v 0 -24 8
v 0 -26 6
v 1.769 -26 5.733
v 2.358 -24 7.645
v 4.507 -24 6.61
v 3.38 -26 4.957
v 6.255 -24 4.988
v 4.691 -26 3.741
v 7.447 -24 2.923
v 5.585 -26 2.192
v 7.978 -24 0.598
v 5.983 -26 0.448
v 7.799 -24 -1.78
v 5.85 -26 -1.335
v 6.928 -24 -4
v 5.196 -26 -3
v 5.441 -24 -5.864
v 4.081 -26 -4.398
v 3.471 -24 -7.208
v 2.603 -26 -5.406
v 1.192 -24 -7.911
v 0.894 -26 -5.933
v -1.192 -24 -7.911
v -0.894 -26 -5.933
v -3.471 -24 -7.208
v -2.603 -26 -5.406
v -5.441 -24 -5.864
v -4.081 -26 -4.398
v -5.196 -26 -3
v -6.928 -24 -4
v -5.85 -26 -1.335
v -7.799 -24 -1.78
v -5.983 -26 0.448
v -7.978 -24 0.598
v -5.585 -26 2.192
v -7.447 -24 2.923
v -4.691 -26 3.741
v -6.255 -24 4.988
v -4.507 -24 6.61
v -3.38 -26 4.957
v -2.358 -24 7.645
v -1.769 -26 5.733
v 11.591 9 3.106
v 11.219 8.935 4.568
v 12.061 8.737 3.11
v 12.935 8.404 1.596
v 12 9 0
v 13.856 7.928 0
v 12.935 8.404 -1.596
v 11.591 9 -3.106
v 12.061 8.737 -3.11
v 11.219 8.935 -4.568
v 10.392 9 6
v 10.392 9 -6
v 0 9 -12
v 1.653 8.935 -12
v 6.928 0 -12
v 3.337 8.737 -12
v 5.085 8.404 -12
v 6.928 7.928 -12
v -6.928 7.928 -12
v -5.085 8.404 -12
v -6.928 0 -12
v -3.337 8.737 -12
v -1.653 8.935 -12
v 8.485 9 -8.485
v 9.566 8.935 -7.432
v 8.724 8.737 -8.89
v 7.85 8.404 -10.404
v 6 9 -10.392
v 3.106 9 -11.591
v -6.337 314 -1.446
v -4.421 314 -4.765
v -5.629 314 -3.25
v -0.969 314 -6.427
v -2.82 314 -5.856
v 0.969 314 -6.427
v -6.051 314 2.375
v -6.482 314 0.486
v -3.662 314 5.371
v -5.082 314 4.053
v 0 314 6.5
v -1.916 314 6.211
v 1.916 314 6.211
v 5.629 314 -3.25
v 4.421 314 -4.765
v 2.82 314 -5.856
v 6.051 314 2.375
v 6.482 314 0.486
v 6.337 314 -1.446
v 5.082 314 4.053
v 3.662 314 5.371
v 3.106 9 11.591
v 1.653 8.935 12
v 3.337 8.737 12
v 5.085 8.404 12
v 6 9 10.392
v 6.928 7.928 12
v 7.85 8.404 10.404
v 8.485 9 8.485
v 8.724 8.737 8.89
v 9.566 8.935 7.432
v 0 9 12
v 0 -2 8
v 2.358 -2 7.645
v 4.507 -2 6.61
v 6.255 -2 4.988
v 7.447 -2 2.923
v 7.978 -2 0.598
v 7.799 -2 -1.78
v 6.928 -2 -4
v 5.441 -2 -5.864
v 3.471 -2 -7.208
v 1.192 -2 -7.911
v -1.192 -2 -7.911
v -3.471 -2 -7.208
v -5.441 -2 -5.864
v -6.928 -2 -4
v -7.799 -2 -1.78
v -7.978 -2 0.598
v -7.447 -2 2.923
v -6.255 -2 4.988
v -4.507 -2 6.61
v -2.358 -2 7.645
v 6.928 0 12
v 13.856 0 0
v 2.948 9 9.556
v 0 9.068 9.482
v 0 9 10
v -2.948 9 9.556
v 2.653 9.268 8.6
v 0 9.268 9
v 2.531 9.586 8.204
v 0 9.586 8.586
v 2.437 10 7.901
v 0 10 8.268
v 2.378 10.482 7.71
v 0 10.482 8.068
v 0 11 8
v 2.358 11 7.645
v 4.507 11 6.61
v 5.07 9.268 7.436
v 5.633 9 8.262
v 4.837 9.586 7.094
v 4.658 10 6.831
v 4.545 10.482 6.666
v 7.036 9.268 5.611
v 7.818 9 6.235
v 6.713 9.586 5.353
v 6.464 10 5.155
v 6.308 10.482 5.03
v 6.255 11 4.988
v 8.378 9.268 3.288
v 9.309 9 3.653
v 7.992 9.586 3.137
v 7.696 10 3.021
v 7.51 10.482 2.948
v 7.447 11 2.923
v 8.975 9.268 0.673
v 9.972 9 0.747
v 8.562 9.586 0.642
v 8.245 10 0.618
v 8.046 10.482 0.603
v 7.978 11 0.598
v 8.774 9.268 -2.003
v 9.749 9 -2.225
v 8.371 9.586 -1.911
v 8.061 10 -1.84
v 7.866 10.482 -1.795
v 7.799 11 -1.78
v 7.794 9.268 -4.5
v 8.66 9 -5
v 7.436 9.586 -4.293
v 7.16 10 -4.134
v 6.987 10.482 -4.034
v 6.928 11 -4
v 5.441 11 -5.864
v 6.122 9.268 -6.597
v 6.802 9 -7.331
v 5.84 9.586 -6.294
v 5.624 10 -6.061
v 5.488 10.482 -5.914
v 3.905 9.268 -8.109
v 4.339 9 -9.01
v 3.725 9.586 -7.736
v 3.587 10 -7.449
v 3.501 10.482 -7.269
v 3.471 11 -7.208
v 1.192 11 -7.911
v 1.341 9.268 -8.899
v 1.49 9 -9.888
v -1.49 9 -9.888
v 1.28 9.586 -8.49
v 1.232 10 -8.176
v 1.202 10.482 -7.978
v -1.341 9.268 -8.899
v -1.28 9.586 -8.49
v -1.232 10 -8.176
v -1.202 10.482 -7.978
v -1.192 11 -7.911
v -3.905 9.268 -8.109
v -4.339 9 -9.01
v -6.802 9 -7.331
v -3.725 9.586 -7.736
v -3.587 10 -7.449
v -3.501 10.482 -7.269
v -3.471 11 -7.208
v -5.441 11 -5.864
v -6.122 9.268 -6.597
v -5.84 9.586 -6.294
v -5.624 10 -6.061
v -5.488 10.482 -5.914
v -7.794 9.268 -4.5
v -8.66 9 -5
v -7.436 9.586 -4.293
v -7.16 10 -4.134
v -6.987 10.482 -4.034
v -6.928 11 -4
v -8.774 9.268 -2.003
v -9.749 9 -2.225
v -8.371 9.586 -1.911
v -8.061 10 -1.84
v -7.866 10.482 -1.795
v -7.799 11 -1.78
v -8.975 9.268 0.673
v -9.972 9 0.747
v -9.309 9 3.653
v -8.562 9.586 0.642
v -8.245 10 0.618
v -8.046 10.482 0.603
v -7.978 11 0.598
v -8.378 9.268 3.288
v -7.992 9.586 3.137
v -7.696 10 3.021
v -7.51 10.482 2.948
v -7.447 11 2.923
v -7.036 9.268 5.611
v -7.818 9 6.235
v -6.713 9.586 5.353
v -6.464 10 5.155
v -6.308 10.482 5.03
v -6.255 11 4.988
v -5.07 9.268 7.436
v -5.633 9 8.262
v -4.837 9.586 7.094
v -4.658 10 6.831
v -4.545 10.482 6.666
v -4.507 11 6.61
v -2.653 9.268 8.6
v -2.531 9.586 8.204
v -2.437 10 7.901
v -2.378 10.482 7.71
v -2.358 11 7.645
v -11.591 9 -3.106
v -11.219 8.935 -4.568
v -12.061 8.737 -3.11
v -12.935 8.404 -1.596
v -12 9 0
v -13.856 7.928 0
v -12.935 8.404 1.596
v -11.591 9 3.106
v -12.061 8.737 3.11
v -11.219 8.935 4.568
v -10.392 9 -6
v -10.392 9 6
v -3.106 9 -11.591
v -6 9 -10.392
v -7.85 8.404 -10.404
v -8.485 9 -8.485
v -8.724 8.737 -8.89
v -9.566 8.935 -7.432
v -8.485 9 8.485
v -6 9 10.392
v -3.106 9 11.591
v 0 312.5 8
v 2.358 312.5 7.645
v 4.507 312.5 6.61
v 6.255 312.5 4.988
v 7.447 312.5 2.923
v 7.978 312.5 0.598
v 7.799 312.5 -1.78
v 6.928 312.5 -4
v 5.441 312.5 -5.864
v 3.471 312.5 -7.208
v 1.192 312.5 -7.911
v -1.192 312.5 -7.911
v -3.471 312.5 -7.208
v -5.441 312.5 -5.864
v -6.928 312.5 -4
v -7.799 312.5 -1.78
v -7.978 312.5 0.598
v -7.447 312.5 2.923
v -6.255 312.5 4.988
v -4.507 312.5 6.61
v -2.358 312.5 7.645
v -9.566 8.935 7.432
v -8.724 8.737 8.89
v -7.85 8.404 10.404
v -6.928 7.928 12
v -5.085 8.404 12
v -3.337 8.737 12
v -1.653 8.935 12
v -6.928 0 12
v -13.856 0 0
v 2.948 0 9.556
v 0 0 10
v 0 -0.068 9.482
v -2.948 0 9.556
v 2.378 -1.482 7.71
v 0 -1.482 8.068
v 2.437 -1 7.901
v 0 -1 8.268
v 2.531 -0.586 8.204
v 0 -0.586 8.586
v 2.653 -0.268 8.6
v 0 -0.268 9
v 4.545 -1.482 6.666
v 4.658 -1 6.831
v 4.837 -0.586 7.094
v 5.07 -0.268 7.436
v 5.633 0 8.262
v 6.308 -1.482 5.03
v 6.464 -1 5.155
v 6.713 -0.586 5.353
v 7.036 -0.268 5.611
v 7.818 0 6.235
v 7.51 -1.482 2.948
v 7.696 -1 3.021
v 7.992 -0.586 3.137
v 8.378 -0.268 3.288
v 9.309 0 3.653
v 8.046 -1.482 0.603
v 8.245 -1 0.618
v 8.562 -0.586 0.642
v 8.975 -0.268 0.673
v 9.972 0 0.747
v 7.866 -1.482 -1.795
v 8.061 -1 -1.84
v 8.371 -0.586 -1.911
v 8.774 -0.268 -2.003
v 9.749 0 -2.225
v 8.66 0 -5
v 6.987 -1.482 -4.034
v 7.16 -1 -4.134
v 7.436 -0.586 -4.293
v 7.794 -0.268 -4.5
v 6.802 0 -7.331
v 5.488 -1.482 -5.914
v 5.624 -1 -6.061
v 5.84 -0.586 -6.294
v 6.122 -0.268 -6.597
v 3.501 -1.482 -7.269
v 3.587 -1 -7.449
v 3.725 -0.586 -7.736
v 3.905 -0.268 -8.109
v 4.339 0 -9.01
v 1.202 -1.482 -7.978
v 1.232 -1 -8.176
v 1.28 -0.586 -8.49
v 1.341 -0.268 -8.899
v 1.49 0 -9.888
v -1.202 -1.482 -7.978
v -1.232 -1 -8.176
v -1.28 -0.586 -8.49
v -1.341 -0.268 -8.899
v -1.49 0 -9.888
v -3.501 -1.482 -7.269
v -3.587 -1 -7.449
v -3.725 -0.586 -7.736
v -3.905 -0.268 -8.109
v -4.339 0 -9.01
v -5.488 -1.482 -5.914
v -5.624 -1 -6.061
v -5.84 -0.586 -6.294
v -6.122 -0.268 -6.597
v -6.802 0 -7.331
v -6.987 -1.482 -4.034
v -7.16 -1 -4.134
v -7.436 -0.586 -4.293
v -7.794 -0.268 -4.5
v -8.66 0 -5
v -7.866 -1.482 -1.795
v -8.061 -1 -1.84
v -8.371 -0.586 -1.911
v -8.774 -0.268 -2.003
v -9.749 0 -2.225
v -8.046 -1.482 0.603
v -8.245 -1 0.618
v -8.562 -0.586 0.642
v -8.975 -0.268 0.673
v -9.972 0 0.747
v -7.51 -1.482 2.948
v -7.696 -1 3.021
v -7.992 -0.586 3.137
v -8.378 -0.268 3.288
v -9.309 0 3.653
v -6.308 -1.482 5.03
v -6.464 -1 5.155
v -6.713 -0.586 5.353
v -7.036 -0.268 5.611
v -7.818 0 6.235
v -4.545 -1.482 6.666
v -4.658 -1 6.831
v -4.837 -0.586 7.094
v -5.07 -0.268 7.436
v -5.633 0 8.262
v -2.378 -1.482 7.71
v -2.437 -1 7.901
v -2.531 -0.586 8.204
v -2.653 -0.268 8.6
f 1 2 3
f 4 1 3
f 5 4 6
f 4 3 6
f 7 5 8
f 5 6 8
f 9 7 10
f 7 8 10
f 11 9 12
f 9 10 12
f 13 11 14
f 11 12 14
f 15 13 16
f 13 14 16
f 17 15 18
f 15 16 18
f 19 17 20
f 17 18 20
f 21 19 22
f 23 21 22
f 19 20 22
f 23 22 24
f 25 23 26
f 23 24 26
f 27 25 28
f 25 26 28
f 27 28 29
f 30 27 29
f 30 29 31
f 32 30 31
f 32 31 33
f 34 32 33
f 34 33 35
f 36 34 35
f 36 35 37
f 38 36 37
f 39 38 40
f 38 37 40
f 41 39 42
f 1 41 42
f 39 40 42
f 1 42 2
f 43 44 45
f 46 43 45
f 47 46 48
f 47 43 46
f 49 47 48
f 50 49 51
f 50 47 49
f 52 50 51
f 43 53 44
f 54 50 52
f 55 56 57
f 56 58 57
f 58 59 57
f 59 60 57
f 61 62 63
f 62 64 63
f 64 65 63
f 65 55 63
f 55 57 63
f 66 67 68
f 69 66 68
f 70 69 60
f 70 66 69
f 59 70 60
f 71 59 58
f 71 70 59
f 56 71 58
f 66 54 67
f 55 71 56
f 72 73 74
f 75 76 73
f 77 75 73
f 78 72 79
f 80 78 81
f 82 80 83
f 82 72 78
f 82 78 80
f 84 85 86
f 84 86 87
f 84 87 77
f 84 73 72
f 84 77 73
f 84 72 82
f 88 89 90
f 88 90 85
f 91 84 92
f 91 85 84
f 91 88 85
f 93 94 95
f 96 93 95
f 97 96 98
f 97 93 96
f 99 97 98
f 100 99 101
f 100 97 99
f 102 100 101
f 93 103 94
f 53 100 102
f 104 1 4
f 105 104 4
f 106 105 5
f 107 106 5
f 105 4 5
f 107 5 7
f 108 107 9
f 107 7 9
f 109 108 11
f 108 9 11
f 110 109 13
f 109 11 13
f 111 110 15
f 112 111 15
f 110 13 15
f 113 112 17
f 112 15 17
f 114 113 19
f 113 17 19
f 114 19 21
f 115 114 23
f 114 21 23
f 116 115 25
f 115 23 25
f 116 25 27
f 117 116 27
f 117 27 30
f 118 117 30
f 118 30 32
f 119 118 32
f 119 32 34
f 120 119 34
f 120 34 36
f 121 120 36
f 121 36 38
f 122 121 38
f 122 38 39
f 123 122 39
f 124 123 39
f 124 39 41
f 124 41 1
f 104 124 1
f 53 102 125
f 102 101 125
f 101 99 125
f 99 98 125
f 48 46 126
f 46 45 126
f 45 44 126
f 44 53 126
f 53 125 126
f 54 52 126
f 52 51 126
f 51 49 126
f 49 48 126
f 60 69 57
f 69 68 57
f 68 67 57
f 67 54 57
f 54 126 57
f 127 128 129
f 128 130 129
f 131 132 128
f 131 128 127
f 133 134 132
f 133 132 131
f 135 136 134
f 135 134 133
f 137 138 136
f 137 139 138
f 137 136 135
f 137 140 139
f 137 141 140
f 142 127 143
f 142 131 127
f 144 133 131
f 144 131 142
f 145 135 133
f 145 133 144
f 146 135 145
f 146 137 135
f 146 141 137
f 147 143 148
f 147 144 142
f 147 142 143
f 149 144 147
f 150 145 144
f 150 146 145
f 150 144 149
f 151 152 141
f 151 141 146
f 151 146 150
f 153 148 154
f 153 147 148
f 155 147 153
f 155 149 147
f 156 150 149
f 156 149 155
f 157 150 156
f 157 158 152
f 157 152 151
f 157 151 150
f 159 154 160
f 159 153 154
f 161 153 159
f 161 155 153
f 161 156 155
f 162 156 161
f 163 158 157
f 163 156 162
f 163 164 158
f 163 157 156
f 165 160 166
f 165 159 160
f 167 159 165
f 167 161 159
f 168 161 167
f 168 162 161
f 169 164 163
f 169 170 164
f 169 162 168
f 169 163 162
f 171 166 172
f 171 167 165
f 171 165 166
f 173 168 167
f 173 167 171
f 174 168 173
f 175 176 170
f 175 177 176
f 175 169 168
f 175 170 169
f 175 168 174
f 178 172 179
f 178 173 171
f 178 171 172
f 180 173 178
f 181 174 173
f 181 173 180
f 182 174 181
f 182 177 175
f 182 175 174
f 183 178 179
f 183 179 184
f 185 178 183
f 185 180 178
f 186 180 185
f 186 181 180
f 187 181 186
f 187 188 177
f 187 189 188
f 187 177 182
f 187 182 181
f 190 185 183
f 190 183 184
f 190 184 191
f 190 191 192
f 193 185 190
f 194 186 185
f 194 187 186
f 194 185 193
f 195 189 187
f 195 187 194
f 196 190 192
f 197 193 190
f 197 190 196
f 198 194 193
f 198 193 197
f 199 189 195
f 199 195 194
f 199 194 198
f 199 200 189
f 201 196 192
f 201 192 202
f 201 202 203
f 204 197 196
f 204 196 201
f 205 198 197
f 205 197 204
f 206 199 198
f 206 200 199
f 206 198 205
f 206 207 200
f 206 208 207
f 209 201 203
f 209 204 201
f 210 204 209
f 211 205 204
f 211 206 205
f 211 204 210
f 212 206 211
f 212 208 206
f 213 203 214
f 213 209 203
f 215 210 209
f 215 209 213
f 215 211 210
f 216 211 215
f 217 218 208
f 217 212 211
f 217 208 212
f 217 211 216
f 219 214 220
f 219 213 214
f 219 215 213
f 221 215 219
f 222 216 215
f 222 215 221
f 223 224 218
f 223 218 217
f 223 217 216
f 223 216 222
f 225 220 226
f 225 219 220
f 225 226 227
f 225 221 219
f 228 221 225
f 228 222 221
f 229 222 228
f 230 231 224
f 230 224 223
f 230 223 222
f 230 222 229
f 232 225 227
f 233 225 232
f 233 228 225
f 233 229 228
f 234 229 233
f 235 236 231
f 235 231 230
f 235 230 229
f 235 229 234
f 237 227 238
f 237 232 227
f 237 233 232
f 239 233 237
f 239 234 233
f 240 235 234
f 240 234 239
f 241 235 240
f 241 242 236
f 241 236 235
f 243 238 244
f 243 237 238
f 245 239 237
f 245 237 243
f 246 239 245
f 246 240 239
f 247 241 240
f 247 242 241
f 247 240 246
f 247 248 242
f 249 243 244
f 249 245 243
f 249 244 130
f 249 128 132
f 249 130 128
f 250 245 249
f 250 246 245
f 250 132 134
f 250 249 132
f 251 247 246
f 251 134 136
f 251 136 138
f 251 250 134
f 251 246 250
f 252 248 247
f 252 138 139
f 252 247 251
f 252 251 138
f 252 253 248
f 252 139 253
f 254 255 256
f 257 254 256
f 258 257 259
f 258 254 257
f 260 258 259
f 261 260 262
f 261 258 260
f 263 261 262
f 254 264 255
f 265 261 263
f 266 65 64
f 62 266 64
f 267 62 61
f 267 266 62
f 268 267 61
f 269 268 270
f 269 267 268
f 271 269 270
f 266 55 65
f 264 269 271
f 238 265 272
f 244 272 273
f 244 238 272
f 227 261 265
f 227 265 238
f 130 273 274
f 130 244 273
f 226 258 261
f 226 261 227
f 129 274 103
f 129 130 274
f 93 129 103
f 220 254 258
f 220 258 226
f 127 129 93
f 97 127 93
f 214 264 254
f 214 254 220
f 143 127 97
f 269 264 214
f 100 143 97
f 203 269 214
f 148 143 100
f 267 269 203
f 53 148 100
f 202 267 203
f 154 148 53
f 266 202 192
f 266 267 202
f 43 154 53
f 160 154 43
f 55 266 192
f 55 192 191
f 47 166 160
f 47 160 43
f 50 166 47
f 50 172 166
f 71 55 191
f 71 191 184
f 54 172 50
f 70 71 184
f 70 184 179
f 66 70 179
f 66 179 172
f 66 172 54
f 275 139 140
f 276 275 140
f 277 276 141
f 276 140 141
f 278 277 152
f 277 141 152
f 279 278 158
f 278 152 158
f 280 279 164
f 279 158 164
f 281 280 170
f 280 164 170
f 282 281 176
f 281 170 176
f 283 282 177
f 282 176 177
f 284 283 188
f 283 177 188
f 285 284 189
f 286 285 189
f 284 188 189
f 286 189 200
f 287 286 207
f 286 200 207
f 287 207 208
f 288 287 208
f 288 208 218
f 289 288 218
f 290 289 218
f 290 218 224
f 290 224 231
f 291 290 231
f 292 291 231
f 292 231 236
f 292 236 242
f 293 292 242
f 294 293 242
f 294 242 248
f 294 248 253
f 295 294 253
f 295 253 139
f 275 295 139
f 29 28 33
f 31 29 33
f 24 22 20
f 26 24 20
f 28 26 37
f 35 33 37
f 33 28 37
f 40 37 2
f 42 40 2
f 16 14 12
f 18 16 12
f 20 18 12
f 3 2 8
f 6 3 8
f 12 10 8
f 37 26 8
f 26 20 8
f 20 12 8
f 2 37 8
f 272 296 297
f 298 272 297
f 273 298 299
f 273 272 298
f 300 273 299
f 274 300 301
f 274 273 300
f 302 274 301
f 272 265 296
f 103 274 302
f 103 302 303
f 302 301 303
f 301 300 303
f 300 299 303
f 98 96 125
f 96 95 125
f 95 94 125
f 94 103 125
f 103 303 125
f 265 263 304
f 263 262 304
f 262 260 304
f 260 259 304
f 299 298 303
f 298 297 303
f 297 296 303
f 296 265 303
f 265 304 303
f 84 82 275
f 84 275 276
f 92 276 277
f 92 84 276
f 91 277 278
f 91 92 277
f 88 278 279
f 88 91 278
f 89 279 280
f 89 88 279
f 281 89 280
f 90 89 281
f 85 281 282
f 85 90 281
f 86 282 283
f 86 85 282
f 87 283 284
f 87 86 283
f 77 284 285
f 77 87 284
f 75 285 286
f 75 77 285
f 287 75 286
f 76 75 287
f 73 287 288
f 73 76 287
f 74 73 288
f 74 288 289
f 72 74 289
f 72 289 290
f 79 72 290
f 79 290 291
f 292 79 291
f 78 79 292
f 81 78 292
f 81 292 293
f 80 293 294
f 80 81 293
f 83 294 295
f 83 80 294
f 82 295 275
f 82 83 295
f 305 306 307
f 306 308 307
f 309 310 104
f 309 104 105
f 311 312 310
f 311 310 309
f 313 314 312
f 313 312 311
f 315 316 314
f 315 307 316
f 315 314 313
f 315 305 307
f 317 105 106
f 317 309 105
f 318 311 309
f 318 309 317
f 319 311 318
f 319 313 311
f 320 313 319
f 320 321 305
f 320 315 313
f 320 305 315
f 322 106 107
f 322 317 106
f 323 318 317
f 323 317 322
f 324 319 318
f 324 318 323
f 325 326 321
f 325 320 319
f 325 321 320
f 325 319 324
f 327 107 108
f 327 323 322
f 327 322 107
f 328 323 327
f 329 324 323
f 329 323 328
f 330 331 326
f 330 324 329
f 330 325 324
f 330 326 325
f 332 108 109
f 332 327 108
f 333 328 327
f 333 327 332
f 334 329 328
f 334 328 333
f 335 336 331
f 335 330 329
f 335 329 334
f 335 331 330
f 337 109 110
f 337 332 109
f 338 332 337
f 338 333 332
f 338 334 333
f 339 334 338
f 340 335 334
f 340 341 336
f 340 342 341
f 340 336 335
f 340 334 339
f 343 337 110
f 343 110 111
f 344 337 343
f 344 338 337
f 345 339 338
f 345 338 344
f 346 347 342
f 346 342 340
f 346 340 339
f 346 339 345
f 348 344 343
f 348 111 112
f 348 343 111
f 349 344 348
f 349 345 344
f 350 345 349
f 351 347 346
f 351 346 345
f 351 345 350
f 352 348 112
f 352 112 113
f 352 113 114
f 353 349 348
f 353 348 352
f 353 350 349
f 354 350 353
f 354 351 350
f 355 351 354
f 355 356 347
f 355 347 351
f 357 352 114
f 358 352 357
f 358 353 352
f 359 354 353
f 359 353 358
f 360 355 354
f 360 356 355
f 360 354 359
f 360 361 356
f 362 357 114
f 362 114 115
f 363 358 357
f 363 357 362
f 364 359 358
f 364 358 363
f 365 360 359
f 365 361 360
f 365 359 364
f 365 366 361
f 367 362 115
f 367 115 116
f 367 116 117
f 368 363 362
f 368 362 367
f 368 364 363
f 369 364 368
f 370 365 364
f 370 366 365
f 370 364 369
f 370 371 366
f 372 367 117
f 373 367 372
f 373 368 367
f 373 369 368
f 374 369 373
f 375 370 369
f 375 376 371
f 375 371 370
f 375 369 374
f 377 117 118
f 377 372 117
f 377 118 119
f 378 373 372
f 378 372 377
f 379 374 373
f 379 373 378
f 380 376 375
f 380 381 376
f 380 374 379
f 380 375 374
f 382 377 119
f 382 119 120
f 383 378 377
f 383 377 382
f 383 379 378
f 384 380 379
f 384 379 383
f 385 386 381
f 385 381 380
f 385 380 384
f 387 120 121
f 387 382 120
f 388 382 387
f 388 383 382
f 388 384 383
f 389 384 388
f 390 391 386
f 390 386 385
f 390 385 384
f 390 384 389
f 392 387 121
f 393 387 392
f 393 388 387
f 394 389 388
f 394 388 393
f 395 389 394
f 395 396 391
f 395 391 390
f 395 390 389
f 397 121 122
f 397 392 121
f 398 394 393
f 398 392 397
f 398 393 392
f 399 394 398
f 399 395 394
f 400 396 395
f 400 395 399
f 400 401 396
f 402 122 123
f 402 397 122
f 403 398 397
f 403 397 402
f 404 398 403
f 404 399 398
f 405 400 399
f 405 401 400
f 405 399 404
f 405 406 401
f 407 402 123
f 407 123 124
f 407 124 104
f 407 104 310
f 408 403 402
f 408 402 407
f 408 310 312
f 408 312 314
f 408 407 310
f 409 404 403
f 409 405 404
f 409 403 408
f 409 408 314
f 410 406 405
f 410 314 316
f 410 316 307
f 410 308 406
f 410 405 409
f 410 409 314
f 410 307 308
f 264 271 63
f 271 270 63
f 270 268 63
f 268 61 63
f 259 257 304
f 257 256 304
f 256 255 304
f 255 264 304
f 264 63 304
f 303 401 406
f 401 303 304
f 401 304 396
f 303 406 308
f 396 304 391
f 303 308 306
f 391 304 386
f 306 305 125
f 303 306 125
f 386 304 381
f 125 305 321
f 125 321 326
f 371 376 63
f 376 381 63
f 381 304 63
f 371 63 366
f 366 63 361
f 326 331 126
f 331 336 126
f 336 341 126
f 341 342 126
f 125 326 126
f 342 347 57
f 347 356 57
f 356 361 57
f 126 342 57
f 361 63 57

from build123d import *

# Parameters (mm, degrees)
BOSS_EXTRUDE1_DEPTH      = 314
BOSS_EXTRUDE1_DEPTH_BACK = 26
SKETCH1_R                = 8
SKETCH1_3_R              = 8
BOSS_EXTRUDE2_DEPTH      = 9
FILLET1_R                = 2
CHAMFER2_SIZE            = 2
CHAMFER3_SIZE            = 1.5
SKETCH2_OUTSIDE_W        = 129.284
SKETCH2_OUTSIDE_H        = 125.572
SKETCH2_OUTSIDE_R        = 12
CUT_EXTRUDE1_DEPTH       = 9
CUT_EXTRUDE1_DRAFT       = -60


with BuildPart() as part:
    # Sketch1 → Boss-Extrude1 (new, two sides: drawn at the far end of the back side and taken through both)
    with BuildSketch(Plane(origin=(0, 0, 0), x_dir=(1, 0, 0), z_dir=(0, 1, 0)).offset(-BOSS_EXTRUDE1_DEPTH_BACK)):
        Circle(SKETCH1_R)
    extrude(amount=BOSS_EXTRUDE1_DEPTH + BOSS_EXTRUDE1_DEPTH_BACK)

    # Sketch1<3> → Boss-Extrude2 (add)
    with BuildSketch(Plane(origin=(0, 0, 0), x_dir=(1, 0, 0), z_dir=(0, 1, 0))):
        Polygon((13.856406461, 0), (6.92820323, 12), (-6.92820323, 12), (-13.856406461, 0), (-6.92820323, -12), (6.92820323, -12), align=None)
        Circle(SKETCH1_3_R, mode=Mode.SUBTRACT)
    extrude(amount=BOSS_EXTRUDE2_DEPTH)

    # Fillet1
    fillet1_edges = [part.edges().sort_by_distance(p)[0] for p in [
        (-8, 9, 0),
        (-8, 0, 0),
    ]]
    fillet(fillet1_edges, radius=FILLET1_R)

    # Chamfer2
    chamfer2_edges = [part.edges().sort_by_distance(p)[0] for p in [
        (-8, -26, 0),
    ]]
    chamfer(chamfer2_edges, length=CHAMFER2_SIZE)

    # Chamfer3
    chamfer3_edges = [part.edges().sort_by_distance(p)[0] for p in [
        (-8, 314, 0),
    ]]
    chamfer(chamfer3_edges, length=CHAMFER3_SIZE)


with BuildPart() as cut_extrude1_tool:
    # Sketch2 outside → Cut-Extrude1 (with draft: the straight prism first)
    with BuildSketch(Plane(origin=(0, 9, 0), x_dir=(1, 0, 0), z_dir=(0, 1, 0))):
        Rectangle(SKETCH2_OUTSIDE_W, SKETCH2_OUTSIDE_H)
        Circle(SKETCH2_OUTSIDE_R, mode=Mode.SUBTRACT)
    extrude(amount=-CUT_EXTRUDE1_DEPTH)
    # Cut-Extrude1: the draft: its side faces are tilted about the plane it starts from
    cut_extrude1_sides = [cut_extrude1_tool.faces().sort_by_distance(p)[0] for p in [
        (0, 4.5, 62.786),
        (64.642, 4.5, 0),
        (0, 4.5, -62.786),
        (-64.642, 4.5, 0),
        (-12, 4.5, 0),
    ]]
    draft(cut_extrude1_sides, Plane(origin=(0, 9, 0), x_dir=(1, 0, 0), z_dir=(0, 1, 0)), CUT_EXTRUDE1_DRAFT)


with BuildPart() as part_1:
    add(part.part)

    # Cut-Extrude1: cut by cut_extrude1_tool
    add(cut_extrude1_tool.part, mode=Mode.SUBTRACT)


solid = part_1.part
